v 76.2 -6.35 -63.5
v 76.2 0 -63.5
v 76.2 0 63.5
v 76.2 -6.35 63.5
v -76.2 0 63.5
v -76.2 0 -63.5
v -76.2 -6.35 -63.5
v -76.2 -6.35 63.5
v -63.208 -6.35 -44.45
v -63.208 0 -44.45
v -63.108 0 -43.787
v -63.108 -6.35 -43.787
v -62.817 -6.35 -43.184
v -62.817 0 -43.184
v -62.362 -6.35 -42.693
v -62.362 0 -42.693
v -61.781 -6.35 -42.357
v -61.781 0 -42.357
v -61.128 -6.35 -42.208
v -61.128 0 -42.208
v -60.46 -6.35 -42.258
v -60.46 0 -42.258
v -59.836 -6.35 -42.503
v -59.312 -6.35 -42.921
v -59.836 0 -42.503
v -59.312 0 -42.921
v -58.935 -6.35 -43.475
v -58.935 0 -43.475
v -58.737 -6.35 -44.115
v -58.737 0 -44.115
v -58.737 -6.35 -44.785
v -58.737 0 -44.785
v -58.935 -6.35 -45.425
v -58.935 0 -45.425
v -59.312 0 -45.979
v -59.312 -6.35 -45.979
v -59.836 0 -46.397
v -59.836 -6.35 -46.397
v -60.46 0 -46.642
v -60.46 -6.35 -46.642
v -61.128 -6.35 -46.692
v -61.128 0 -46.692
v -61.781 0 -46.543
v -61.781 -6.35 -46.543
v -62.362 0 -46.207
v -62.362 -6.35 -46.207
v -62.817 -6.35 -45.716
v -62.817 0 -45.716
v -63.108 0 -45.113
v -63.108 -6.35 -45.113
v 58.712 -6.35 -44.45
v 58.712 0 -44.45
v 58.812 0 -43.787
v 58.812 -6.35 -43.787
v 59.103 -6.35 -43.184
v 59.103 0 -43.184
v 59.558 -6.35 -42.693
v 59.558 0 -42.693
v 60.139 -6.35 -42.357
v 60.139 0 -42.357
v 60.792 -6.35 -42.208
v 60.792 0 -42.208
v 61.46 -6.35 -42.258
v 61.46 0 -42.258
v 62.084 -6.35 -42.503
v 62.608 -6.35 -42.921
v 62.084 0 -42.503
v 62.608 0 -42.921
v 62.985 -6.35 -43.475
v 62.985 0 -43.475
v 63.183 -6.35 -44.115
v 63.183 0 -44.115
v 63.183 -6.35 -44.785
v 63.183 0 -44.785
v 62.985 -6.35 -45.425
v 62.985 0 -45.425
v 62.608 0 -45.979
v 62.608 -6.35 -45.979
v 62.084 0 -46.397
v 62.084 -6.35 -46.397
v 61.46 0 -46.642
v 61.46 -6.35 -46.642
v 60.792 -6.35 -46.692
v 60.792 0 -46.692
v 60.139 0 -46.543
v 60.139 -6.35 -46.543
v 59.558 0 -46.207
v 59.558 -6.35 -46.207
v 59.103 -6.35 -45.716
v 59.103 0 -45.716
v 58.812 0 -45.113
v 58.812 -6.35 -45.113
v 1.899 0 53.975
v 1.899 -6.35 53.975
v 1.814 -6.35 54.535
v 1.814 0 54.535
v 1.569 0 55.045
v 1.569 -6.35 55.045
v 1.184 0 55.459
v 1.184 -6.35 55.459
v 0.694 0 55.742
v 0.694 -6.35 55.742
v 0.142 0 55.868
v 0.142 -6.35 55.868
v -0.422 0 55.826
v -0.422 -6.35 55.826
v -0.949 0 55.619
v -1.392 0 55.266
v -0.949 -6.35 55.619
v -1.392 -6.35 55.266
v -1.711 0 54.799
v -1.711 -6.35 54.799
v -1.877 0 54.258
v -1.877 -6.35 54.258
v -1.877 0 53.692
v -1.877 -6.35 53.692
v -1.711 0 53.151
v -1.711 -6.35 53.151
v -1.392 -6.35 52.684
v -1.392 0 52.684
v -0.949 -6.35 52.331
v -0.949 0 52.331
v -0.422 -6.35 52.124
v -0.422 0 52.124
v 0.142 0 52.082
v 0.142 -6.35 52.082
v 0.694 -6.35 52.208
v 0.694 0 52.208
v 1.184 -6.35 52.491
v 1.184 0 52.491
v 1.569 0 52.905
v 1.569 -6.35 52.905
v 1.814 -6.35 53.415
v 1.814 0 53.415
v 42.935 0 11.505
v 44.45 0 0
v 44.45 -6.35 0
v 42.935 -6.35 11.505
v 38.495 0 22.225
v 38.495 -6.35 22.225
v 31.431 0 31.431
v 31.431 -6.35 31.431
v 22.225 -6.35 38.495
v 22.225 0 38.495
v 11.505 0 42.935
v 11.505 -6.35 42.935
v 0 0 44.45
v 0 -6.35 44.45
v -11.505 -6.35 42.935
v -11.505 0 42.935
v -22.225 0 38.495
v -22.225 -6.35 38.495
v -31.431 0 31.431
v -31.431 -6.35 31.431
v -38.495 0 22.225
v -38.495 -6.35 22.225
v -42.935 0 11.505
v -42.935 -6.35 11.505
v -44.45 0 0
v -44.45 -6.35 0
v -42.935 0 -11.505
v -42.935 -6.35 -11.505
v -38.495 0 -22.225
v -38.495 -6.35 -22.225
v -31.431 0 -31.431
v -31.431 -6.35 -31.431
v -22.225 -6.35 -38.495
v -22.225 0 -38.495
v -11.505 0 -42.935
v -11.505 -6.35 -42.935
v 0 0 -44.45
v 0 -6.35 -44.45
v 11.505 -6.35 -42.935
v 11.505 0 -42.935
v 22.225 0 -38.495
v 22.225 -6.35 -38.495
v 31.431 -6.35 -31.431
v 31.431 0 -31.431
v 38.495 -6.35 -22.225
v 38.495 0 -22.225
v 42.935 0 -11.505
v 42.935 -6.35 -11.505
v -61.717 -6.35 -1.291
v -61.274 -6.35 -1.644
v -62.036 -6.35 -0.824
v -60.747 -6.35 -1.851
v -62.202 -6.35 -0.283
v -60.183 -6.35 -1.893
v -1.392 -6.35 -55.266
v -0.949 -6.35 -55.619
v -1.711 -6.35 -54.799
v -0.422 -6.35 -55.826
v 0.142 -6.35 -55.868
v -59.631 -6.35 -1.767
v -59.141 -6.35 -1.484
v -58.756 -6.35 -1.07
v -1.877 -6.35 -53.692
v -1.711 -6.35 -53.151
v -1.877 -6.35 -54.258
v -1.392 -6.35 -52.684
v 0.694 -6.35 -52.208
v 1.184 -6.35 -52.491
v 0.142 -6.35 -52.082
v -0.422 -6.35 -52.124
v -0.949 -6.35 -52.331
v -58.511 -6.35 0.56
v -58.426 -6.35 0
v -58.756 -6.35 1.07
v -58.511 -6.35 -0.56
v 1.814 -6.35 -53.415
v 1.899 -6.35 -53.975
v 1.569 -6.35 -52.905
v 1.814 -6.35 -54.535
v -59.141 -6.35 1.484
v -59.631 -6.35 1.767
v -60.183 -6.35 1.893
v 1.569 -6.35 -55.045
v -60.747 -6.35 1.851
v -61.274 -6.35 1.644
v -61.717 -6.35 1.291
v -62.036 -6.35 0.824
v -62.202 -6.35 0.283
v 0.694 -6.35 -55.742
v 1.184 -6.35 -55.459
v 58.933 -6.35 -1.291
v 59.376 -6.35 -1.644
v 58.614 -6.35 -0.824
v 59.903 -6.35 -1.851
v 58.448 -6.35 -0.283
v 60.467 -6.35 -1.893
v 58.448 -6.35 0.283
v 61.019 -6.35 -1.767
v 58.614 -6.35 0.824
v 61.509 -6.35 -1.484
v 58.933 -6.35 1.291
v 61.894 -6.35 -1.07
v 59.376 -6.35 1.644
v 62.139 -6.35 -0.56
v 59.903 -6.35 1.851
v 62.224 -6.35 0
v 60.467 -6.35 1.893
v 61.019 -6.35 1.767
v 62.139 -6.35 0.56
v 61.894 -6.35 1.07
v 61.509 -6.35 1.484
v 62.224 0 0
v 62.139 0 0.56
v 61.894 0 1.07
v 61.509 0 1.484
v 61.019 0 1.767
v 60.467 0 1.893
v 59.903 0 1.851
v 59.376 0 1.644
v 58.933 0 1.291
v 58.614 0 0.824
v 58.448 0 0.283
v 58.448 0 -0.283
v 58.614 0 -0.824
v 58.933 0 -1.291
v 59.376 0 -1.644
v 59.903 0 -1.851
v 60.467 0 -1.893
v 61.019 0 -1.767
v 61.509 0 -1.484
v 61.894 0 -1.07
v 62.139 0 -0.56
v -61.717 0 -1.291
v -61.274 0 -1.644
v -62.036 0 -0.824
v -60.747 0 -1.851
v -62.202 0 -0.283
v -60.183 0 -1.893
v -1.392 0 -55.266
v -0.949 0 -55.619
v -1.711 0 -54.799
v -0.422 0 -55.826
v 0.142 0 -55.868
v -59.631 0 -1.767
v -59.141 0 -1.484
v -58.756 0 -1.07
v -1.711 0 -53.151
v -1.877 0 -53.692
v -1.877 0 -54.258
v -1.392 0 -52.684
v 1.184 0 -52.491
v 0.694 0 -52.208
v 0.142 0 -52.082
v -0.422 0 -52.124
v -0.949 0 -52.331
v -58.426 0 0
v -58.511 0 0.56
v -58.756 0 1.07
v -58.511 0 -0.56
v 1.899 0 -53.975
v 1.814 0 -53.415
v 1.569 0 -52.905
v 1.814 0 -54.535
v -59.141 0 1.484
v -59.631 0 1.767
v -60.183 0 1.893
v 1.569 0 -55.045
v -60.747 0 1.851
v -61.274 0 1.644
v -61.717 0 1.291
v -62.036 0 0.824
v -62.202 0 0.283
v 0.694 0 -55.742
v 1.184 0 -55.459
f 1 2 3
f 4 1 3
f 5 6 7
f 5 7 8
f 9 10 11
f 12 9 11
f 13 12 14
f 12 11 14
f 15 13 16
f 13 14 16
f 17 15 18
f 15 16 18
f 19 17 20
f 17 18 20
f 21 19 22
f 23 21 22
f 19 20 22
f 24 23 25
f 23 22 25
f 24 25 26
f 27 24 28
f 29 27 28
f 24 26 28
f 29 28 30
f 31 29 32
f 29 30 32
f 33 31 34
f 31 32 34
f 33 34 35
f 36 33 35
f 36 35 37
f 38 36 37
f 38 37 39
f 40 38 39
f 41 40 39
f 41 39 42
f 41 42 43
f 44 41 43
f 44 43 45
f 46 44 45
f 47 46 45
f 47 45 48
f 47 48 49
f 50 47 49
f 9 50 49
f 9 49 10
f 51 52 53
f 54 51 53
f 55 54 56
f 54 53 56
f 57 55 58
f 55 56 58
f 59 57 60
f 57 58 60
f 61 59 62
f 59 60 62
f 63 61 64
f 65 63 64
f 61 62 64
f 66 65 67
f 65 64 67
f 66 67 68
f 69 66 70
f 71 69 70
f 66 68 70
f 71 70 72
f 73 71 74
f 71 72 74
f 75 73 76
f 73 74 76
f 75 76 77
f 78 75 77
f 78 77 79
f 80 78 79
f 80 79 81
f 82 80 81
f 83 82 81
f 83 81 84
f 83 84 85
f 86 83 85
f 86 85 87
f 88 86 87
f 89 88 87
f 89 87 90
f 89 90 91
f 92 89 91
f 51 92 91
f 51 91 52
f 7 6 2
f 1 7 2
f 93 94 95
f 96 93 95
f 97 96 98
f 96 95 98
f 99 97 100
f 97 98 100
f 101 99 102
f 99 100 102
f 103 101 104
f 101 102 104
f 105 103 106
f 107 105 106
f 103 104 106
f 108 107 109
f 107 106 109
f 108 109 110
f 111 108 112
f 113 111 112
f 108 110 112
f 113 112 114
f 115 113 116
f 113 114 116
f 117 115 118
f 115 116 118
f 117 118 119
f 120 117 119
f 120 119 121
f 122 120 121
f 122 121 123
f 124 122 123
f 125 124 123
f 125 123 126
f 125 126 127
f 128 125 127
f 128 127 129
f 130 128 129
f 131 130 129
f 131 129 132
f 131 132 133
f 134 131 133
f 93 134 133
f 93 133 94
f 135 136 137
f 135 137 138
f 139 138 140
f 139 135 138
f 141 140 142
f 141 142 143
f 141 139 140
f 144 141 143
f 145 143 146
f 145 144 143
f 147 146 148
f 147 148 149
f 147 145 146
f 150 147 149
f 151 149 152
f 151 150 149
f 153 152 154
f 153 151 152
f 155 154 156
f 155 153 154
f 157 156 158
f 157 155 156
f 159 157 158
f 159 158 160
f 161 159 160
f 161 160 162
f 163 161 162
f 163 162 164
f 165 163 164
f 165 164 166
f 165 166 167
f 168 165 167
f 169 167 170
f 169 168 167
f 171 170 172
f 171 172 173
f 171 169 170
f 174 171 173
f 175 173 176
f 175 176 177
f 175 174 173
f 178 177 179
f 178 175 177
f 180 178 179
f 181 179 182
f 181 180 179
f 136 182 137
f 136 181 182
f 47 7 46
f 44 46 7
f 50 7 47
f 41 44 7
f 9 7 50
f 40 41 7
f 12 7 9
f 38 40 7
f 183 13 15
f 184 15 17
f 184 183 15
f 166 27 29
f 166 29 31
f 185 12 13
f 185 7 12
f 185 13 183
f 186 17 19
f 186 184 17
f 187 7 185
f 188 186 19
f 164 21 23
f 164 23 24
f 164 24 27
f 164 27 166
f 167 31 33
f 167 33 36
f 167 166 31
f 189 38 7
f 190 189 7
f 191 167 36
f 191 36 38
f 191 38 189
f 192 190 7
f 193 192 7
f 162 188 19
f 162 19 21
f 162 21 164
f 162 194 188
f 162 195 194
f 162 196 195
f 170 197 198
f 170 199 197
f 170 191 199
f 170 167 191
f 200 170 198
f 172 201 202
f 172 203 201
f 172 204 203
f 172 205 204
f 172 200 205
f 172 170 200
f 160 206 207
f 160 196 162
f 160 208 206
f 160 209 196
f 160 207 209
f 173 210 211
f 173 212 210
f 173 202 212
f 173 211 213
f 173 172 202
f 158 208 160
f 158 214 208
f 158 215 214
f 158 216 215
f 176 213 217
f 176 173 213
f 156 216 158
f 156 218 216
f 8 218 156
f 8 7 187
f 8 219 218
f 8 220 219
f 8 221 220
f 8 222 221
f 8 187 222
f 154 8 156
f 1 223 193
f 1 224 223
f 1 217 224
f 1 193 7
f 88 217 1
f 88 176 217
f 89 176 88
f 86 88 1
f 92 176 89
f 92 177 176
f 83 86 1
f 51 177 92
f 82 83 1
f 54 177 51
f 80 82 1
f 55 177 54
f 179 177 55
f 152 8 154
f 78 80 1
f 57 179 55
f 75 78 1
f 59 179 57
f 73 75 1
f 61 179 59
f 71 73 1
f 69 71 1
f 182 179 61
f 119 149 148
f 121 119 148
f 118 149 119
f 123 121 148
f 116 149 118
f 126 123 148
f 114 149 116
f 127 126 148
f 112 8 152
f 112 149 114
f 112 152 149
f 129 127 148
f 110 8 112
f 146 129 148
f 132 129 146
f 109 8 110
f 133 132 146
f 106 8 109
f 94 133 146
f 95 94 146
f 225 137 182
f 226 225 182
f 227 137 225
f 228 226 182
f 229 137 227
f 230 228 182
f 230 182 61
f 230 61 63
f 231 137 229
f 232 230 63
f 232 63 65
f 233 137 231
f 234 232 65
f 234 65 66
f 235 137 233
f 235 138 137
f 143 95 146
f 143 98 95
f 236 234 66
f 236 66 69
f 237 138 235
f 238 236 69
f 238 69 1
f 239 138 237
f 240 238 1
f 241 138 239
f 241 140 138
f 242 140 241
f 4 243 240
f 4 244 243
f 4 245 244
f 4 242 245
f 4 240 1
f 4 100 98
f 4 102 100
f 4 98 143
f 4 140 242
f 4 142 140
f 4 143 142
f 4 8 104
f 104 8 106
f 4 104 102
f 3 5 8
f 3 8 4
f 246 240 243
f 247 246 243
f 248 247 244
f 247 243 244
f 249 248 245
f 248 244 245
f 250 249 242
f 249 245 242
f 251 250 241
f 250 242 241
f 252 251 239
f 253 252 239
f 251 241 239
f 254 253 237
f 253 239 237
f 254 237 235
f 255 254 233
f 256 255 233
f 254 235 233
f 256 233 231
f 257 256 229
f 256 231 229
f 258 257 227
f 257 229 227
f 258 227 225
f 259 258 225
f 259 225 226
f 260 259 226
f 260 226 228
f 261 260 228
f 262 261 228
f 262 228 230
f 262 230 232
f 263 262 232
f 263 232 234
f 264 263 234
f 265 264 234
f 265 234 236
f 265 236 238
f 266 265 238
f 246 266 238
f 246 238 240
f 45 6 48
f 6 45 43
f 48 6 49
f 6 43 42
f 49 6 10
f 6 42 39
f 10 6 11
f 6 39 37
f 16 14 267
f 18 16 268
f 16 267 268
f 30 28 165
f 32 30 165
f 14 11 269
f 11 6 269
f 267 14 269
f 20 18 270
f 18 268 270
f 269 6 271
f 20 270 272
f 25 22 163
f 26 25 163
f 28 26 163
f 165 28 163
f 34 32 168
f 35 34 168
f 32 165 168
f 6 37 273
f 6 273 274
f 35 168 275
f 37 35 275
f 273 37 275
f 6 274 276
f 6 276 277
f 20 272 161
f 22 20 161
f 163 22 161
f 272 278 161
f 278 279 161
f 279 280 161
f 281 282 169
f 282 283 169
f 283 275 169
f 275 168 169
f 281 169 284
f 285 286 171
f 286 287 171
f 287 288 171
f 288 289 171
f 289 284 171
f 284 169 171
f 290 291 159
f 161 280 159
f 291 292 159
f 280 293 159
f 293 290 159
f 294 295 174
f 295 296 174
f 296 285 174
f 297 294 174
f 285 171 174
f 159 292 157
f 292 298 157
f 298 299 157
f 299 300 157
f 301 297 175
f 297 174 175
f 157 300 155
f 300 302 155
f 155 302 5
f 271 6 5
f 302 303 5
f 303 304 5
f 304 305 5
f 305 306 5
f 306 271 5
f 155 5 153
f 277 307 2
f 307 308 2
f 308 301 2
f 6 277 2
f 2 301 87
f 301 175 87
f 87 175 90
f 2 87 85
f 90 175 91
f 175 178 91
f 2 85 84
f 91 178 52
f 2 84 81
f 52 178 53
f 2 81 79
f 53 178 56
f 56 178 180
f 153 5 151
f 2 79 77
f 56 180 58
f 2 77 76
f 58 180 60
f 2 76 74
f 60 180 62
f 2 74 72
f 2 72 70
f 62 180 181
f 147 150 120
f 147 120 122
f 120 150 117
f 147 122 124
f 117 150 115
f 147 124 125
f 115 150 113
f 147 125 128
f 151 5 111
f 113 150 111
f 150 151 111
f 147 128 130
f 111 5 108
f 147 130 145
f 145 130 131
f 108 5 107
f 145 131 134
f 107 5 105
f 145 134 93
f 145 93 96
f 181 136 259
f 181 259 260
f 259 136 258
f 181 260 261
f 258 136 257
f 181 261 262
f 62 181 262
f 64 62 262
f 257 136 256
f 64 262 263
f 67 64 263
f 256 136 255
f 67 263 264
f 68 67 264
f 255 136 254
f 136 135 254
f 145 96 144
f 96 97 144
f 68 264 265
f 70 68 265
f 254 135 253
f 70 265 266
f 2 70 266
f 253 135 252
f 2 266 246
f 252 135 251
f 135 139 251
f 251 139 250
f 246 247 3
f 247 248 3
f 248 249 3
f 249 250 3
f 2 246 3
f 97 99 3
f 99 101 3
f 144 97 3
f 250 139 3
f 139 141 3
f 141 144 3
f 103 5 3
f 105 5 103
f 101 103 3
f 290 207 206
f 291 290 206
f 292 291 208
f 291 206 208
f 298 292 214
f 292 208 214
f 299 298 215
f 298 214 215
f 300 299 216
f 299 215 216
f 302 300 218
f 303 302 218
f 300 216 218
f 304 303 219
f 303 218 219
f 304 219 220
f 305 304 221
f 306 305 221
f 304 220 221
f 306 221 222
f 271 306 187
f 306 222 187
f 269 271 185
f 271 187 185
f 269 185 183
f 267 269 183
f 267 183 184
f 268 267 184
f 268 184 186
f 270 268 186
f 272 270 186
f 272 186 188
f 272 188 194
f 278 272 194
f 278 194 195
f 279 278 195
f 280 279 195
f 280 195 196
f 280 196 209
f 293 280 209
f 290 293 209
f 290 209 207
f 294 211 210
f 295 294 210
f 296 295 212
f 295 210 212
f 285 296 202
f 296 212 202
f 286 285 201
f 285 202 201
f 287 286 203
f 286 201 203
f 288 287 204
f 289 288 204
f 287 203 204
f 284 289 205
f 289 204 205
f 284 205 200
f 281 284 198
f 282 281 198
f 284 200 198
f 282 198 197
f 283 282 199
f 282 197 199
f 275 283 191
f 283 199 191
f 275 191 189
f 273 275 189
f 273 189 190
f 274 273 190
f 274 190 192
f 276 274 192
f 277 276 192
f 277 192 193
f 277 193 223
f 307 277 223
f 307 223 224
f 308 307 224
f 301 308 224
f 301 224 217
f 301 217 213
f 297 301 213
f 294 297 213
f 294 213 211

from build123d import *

# Parameters (mm, degrees)
F0_W     = 152.4
F0_H     = 127
F0_R     = 44.45
F1_DEPTH = 6.35
F4_D     = 3.7973
F6_D     = 4.4958


with BuildPart() as f1:
    # F0 (on Front) → F1 (new body)
    with BuildSketch(Plane.XZ):
        Rectangle(F0_W, F0_H)
        Circle(F0_R, mode=Mode.SUBTRACT)
    extrude(amount=F1_DEPTH)

    # F4 (through all)
    with Locations(Plane(origin=(0, 0, 0), x_dir=(-1, 0, 0), z_dir=(0, 1, 0))):
        with Locations((-60.325, 0), (0, 53.975), (60.325, 0), (0, -53.975)):
            Hole(F4_D / 2)

    # F6 (through all)
    with Locations(Plane.XZ.offset(6.35)):
        with Locations((-60.96, -44.45), (60.96, -44.45)):
            Hole(F6_D / 2)


solid = f1.part
